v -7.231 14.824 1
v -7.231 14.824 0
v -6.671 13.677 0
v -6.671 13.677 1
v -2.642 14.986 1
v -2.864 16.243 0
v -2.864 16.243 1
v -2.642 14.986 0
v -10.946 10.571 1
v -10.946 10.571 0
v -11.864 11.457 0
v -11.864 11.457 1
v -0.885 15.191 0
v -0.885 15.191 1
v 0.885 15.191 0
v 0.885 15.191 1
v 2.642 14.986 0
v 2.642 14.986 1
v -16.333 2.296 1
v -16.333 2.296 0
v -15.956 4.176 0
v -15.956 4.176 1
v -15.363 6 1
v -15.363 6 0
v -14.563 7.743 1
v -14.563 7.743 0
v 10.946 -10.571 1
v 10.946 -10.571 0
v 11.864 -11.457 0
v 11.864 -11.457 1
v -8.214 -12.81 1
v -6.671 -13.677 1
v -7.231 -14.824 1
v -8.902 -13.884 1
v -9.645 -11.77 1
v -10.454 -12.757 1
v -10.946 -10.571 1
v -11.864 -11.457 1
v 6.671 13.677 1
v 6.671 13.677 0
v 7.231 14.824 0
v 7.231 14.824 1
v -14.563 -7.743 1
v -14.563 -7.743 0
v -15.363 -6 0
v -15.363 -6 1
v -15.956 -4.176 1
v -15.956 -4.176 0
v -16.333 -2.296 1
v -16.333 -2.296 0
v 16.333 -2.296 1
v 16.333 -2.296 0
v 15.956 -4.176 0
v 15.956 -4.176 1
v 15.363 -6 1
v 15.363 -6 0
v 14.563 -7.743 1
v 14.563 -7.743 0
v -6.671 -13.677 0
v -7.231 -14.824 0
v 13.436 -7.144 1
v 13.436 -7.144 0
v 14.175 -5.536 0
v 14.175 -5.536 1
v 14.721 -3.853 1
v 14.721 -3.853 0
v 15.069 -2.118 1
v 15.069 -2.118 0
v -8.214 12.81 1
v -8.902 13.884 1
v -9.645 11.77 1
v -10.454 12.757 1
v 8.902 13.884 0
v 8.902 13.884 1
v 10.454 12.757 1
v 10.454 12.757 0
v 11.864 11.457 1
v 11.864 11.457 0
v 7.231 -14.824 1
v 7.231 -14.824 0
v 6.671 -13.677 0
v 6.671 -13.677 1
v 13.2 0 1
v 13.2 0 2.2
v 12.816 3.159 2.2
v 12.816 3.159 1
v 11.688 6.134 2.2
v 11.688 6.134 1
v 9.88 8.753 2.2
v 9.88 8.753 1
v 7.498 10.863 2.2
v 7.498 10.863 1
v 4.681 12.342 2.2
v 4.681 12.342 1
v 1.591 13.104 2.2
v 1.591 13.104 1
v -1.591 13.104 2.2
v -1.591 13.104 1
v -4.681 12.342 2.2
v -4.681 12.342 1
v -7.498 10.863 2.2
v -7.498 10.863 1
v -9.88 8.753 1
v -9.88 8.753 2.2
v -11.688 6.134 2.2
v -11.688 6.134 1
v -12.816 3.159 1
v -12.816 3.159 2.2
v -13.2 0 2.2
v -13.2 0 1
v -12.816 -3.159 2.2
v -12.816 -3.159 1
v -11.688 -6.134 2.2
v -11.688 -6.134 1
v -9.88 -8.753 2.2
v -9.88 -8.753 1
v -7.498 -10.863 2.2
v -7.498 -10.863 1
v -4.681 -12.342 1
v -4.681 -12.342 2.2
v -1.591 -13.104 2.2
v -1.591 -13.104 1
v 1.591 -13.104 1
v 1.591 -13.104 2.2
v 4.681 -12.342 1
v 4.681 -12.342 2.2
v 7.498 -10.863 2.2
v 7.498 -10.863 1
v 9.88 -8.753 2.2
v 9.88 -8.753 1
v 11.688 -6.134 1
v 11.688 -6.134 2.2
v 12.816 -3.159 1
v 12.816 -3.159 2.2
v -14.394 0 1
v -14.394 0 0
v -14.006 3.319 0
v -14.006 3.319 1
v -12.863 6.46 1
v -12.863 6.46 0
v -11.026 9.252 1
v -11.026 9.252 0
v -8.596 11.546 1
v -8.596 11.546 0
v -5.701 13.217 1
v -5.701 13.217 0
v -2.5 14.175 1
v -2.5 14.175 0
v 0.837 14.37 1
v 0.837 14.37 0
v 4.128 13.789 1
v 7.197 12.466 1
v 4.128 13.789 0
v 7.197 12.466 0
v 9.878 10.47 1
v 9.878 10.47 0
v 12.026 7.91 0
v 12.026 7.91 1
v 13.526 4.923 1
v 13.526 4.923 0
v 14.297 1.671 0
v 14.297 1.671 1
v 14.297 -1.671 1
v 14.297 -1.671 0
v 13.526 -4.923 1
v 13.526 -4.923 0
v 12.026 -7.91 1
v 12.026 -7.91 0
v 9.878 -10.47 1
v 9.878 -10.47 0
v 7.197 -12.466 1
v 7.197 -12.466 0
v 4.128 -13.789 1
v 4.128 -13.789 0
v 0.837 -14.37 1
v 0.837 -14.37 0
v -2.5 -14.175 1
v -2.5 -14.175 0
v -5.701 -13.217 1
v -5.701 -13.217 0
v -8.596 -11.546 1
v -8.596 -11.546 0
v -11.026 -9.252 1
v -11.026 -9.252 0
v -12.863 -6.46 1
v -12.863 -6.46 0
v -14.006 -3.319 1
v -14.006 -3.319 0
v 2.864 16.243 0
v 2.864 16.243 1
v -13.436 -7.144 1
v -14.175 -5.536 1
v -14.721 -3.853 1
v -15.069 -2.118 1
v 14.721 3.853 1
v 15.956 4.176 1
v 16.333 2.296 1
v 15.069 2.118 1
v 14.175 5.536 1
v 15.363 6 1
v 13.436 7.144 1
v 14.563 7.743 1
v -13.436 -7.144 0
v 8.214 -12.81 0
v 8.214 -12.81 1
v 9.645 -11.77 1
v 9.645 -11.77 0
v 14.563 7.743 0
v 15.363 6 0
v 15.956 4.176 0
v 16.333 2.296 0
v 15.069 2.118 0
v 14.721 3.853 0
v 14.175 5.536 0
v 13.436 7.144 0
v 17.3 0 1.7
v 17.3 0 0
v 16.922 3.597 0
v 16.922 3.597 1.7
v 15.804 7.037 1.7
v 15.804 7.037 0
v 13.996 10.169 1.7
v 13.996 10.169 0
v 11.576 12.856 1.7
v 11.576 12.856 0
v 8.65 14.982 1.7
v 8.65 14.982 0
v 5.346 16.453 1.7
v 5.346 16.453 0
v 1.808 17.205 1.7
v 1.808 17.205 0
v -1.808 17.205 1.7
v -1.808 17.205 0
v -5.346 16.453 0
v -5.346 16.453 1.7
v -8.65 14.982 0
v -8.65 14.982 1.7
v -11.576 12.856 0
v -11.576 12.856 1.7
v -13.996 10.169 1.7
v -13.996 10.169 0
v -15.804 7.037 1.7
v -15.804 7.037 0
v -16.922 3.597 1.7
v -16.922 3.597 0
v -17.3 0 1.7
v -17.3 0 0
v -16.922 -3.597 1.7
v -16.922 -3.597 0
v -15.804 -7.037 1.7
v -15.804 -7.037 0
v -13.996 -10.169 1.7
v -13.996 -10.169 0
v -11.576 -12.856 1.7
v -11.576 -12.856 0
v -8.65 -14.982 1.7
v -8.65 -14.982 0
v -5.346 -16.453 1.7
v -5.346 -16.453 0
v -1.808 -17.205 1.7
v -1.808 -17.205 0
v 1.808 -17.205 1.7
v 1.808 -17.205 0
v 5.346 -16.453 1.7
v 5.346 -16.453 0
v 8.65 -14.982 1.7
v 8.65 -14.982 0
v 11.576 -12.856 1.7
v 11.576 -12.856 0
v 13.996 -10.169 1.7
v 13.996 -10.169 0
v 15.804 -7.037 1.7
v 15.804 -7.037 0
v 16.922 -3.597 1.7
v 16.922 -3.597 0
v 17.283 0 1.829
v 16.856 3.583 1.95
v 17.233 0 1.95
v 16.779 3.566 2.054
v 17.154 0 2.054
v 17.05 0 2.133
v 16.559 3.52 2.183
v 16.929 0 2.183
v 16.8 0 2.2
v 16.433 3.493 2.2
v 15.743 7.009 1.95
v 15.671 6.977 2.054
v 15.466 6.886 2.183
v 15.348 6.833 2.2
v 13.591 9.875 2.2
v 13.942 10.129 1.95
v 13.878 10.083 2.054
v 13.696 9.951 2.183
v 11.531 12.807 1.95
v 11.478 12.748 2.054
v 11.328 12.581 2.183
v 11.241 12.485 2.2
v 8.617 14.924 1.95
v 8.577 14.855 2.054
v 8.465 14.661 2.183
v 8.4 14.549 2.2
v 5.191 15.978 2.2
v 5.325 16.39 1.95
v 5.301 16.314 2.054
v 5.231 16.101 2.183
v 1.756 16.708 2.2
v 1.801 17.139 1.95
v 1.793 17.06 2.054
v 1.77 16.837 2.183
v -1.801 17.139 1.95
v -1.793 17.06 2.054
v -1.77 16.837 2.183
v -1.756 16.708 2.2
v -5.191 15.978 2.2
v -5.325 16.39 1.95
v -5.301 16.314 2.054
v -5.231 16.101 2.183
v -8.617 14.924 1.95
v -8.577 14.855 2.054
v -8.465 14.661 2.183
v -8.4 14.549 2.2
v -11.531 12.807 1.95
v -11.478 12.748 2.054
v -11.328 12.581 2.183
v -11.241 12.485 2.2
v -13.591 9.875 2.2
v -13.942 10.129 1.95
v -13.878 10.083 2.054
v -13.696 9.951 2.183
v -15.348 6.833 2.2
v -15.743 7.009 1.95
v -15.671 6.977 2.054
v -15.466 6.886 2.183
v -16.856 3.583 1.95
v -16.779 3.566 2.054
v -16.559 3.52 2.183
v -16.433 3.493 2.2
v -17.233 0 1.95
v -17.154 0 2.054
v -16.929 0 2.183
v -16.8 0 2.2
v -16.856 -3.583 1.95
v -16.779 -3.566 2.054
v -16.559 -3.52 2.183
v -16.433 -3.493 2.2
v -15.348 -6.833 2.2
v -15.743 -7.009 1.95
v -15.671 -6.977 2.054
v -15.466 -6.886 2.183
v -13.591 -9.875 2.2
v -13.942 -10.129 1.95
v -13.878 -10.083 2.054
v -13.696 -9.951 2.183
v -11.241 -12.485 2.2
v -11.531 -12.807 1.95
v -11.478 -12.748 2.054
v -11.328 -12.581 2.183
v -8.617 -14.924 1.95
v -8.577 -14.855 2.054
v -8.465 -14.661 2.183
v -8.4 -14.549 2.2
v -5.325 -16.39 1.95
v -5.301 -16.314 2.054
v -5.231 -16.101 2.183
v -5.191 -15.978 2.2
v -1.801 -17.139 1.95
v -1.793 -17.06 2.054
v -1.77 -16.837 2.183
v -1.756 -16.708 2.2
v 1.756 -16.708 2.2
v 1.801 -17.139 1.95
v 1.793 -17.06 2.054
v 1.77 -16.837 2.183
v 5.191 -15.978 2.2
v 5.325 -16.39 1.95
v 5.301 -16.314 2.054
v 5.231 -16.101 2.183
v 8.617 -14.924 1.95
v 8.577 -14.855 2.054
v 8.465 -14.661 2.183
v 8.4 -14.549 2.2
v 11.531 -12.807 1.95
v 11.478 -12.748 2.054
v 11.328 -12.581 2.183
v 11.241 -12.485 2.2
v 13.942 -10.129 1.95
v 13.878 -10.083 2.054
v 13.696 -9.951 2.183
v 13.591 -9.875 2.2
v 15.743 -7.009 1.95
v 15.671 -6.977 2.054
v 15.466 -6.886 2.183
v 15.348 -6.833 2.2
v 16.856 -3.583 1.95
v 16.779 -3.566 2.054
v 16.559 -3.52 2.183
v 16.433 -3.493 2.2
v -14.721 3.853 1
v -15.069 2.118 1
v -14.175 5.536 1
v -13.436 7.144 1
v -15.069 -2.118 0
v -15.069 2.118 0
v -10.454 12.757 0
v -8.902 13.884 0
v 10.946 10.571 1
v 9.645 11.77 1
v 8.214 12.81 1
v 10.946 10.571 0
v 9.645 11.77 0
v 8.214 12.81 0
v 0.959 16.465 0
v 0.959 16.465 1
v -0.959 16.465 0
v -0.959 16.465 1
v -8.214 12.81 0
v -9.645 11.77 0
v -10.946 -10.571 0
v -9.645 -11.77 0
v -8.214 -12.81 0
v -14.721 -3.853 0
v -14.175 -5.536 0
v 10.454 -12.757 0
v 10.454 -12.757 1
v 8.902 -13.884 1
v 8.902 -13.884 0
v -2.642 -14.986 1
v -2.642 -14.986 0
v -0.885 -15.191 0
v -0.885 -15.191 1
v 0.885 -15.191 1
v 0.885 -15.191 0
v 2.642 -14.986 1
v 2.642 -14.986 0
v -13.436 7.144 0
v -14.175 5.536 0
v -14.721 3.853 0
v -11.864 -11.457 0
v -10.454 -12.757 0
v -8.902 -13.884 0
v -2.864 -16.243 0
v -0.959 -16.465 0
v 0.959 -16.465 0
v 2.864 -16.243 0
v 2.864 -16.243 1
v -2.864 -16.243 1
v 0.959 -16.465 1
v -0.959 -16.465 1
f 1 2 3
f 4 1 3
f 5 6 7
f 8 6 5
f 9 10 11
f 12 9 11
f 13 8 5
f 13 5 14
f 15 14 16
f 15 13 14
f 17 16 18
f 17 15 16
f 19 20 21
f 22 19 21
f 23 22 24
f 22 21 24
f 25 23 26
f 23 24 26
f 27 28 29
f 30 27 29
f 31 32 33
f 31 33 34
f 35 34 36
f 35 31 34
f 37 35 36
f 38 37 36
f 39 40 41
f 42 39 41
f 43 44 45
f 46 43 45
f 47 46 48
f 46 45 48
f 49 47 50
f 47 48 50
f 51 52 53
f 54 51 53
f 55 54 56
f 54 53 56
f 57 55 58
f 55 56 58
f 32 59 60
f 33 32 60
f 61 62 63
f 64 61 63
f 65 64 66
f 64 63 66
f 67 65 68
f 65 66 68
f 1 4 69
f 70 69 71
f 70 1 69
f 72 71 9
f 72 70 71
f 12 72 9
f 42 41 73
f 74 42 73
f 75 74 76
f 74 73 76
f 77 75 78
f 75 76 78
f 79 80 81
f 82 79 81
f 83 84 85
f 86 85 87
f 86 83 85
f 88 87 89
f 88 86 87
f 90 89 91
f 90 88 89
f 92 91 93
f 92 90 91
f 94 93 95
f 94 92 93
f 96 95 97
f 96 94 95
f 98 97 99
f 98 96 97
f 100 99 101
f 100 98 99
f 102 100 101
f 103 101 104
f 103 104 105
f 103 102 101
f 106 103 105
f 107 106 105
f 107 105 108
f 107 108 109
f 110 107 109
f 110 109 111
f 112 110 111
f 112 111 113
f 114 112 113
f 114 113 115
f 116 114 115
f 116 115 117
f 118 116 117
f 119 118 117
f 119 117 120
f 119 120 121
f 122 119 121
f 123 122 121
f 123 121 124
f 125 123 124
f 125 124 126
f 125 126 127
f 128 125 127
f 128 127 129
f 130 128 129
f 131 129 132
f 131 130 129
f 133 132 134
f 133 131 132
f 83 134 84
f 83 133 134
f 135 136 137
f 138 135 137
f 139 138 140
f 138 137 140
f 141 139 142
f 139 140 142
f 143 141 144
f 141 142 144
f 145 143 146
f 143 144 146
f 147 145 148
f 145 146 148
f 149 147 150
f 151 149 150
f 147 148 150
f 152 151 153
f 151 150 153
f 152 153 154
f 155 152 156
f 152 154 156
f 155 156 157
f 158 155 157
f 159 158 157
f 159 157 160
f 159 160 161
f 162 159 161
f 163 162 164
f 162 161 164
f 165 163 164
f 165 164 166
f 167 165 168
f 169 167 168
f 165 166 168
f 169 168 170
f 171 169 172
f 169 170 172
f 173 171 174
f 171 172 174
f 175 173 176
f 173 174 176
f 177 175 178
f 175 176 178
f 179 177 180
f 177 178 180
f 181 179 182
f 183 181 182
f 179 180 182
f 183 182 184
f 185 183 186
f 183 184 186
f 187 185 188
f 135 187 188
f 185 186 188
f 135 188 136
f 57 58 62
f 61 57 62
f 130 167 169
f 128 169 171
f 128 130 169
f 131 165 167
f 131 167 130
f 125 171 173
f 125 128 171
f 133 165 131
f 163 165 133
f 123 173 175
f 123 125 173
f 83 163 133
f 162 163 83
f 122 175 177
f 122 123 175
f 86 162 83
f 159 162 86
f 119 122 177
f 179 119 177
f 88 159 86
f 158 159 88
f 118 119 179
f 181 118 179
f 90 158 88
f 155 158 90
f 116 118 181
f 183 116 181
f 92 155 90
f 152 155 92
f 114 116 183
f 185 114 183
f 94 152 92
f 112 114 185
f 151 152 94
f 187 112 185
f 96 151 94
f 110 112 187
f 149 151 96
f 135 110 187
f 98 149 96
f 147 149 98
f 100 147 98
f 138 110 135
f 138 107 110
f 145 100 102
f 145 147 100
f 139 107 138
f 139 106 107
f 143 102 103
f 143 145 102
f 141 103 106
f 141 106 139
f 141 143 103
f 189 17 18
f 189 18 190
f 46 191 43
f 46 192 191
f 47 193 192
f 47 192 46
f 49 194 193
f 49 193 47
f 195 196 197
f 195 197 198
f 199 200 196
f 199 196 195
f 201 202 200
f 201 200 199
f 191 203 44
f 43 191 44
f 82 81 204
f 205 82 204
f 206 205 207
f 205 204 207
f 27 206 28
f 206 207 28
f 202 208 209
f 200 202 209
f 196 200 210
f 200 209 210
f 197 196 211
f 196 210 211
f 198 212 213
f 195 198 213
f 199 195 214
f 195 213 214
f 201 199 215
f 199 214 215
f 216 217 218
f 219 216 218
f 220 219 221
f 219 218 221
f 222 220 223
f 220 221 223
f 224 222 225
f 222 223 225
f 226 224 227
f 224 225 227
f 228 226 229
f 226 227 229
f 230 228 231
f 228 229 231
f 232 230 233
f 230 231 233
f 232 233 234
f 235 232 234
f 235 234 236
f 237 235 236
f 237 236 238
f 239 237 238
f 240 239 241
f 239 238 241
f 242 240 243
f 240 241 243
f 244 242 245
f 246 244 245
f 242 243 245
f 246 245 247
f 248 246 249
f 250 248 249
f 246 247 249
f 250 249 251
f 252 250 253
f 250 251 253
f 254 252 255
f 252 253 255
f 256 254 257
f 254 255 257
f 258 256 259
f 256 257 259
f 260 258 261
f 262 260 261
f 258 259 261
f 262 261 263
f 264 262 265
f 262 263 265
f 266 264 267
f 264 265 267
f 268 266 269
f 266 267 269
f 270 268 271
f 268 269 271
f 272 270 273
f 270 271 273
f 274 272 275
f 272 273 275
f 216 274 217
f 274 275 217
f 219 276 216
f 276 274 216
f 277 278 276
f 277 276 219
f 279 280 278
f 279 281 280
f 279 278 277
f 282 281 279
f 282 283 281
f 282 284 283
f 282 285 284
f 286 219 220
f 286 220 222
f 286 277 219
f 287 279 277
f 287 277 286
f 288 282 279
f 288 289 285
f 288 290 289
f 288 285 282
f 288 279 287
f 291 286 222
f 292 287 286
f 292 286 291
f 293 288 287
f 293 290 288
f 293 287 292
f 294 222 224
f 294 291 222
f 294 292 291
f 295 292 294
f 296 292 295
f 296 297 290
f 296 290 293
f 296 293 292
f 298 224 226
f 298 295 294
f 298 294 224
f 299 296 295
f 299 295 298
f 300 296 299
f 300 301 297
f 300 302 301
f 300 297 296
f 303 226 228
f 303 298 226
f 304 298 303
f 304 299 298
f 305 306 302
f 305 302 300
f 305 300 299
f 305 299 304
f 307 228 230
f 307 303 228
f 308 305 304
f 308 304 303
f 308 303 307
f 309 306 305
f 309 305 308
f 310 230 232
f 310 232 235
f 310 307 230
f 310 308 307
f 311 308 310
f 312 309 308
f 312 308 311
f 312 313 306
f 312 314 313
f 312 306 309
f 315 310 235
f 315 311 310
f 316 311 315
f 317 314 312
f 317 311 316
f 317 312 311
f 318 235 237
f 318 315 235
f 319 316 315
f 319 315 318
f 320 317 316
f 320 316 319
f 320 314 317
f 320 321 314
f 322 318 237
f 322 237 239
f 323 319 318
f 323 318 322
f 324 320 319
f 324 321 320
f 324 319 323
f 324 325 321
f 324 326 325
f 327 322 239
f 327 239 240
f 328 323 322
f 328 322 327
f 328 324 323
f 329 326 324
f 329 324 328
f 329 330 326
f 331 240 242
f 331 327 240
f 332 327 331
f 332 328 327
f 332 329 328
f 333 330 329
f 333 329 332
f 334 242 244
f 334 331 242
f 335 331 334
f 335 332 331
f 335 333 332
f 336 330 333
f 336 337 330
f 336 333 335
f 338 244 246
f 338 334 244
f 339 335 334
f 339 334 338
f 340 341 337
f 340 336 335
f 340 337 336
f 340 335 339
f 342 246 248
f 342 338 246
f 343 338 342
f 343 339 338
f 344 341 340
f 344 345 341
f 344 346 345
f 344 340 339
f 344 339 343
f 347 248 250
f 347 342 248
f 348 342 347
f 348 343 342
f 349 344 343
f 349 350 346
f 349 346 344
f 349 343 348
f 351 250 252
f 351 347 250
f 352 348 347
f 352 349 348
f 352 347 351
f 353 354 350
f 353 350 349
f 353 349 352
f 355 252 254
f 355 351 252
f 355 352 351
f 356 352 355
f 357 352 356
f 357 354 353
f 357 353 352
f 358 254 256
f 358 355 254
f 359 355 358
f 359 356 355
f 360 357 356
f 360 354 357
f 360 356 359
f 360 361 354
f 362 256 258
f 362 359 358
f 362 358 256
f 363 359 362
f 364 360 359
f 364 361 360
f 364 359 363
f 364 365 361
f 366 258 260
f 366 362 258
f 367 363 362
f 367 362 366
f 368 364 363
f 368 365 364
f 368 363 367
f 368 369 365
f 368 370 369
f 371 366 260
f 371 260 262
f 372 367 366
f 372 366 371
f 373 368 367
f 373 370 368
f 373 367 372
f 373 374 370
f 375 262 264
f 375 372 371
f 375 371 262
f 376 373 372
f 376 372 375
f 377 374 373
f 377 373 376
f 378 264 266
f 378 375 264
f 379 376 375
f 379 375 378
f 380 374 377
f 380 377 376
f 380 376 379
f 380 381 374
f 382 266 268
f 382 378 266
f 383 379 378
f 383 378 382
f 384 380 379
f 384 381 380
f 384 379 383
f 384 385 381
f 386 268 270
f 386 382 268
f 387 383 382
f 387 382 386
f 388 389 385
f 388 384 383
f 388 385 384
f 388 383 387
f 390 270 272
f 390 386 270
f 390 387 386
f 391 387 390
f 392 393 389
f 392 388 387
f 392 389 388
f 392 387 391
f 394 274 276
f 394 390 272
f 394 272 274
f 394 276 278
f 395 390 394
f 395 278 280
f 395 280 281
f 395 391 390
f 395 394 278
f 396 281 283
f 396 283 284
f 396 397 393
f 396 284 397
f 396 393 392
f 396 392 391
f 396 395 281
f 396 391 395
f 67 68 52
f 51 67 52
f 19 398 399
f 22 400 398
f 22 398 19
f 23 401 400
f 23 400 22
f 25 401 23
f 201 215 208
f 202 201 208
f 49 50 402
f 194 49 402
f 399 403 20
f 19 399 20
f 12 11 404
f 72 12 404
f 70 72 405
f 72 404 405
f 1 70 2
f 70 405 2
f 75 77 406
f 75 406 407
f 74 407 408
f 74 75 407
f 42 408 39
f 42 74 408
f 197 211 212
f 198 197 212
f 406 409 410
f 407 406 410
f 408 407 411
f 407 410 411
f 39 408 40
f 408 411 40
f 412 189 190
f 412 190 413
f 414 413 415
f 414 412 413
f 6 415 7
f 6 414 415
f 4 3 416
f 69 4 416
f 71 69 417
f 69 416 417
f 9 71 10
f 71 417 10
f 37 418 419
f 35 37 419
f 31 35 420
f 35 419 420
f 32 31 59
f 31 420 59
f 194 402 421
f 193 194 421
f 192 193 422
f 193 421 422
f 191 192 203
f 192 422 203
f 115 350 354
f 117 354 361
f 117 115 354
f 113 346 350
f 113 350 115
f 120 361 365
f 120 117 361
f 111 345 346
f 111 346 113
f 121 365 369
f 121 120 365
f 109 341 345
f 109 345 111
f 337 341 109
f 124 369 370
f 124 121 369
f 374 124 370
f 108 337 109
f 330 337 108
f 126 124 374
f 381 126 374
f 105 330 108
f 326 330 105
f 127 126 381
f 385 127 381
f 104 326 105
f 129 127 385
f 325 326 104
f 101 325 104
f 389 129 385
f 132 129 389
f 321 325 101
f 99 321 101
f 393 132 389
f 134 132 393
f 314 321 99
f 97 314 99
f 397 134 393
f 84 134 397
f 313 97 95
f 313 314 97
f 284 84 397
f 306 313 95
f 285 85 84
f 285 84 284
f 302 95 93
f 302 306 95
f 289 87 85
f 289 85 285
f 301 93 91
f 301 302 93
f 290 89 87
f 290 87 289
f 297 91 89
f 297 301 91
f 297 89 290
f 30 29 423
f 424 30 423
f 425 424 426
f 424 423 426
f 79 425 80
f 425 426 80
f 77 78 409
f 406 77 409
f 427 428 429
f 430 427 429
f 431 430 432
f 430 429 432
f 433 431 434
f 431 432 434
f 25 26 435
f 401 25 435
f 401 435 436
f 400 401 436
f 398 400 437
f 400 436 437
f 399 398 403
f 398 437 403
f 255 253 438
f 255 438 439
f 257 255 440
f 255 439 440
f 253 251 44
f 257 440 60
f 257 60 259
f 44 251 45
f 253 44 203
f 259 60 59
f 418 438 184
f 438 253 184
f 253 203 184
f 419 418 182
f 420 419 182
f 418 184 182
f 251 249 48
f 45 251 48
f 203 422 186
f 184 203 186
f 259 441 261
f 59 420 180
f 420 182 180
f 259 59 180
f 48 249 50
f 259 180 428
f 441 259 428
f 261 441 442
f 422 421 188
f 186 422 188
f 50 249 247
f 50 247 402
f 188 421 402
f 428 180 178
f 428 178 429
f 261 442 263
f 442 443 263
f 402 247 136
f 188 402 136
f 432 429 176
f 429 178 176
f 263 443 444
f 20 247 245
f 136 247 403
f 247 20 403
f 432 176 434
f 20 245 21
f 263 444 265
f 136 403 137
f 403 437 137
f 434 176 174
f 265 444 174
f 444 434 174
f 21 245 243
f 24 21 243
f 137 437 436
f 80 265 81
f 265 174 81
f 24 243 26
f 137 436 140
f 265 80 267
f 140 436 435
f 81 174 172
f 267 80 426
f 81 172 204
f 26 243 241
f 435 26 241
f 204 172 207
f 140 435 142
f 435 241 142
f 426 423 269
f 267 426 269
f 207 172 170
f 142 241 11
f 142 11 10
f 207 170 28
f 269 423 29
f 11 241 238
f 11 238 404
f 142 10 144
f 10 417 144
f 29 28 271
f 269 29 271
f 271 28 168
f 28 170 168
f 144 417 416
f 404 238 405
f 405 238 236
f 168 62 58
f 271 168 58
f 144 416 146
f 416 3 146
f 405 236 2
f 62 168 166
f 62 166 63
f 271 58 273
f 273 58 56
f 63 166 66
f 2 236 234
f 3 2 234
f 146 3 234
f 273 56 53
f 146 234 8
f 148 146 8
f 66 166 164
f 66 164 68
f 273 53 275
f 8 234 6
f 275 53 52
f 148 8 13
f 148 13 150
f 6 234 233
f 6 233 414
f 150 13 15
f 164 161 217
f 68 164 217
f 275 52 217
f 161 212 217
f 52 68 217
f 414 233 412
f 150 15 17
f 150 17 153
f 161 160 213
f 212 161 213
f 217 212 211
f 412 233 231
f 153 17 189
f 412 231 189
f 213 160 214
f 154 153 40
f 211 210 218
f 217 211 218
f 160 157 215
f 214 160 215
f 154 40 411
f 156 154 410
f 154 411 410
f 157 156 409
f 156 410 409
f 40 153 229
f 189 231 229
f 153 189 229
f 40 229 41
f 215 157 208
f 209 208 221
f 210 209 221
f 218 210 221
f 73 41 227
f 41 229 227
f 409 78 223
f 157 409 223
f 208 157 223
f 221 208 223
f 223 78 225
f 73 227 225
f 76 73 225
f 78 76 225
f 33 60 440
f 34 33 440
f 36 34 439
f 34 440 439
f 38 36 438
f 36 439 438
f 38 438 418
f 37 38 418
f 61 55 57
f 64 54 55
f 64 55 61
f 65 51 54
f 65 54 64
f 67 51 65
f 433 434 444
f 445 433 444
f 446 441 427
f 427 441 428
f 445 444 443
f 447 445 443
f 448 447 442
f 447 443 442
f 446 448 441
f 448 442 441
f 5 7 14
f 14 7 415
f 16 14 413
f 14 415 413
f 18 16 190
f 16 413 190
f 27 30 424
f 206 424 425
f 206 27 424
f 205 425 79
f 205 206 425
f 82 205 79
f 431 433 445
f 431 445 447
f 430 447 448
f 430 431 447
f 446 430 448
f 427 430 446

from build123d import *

# Parameters (mm, degrees)
SKETCH_1_R          = 17.3
SKETCH_1_R_2        = 13.2
EXTRUDE_1_DEPTH     = 2.2
SKETCH_2_R          = 14.394054642
CUT_EXTRUDE_1_DEPTH = 1
CUT_EXTRUDE_2_DEPTH = 1
FILLET_1_R          = 0.5


with BuildPart() as part:
    # 草图1 → 凸台-拉伸1 (new body)
    with BuildSketch(Plane.XY):
        Circle(SKETCH_1_R)
        Circle(SKETCH_1_R_2, mode=Mode.SUBTRACT)
    extrude(amount=EXTRUDE_1_DEPTH)

    # 草图2 → 切除-拉伸1 (cut)
    with BuildSketch(Plane(origin=(0, 0, 0), x_dir=(-1, 0, 0), z_dir=(0, 0, -1))):
        Circle(SKETCH_2_R)
    extrude(amount=-CUT_EXTRUDE_1_DEPTH, mode=Mode.SUBTRACT)

    # 草图3 → 切除-拉伸2 (cut)
    with BuildSketch(Plane(origin=(0, 0, 0), x_dir=(-1, 0, 0), z_dir=(0, 0, -1))):
        with BuildLine():
            Line((-2.642058299, 14.986101169), (-2.863597348, 16.242699714))
            ThreePointArc((-2.863597348, 16.242699714), (0, 16.493195075), (2.863597348, 16.242699714))
            Line((2.863597348, 16.242699714), (2.642058299, 14.986101169))
            ThreePointArc((2.642058299, 14.986101169), (0, 15.217217233), (-2.642058299, 14.986101169))
        make_face()
        with BuildLine():
            Line((10.94607932, 10.571047622), (11.863918269, 11.457439813))
            ThreePointArc((11.863918269, 11.457439813), (9.694456828, 13.343275107), (7.23052043, 14.823800393))
            Line((7.23052043, 14.823800393), (6.671139193, 13.676973429))
            ThreePointArc((6.671139193, 13.676973429), (8.94445587, 12.310987348), (10.94607932, 10.571047622))
        make_face()
        with BuildLine():
            Line((15.069070085, 2.118213179), (16.332625651, 2.295827328))
            ThreePointArc((16.332625651, 2.295827328), (15.685960651, 5.09667757), (14.56282516, 7.742713165))
            Line((14.56282516, 7.742713165), (13.436188256, 7.143706702))
            ThreePointArc((13.436188256, 7.143706702), (14.472433609, 4.702378732), (15.069070085, 2.118213179))
        make_face()
        with BuildLine():
            Line((13.436188256, -7.143706702), (14.56282516, -7.742713165))
            ThreePointArc((14.56282516, -7.742713165), (15.685960651, -5.09667757), (16.332625651, -2.295827328))
            Line((16.332625651, -2.295827328), (15.069070085, -2.118213179))
            ThreePointArc((15.069070085, -2.118213179), (14.472433609, -4.702378732), (13.436188256, -7.143706702))
        make_face()
        with BuildLine():
            Line((6.671139193, -13.676973429), (7.23052043, -14.823800393))
            ThreePointArc((7.23052043, -14.823800393), (9.694456828, -13.343275107), (11.863918269, -11.457439813))
            Line((11.863918269, -11.457439813), (10.94607932, -10.571047622))
            ThreePointArc((10.94607932, -10.571047622), (8.94445587, -12.310987348), (6.671139193, -13.676973429))
        make_face()
        with BuildLine():
            Line((-2.642058299, -14.986101169), (-2.863597348, -16.242699714))
            ThreePointArc((-2.863597348, -16.242699714), (0, -16.493195075), (2.863597348, -16.242699714))
            Line((2.863597348, -16.242699714), (2.642058299, -14.986101169))
            ThreePointArc((2.642058299, -14.986101169), (0, -15.217217233), (-2.642058299, -14.986101169))
        make_face()
        with BuildLine():
            Line((-10.94607932, -10.571047622), (-11.863918269, -11.457439813))
            ThreePointArc((-11.863918269, -11.457439813), (-9.694456828, -13.343275107), (-7.23052043, -14.823800393))
            Line((-7.23052043, -14.823800393), (-6.671139193, -13.676973429))
            ThreePointArc((-6.671139193, -13.676973429), (-8.94445587, -12.310987348), (-10.94607932, -10.571047622))
        make_face()
        with BuildLine():
            Line((-15.069070085, -2.118213179), (-16.332625651, -2.295827328))
            ThreePointArc((-16.332625651, -2.295827328), (-15.685960651, -5.09667757), (-14.56282516, -7.742713165))
            Line((-14.56282516, -7.742713165), (-13.436188256, -7.143706702))
            ThreePointArc((-13.436188256, -7.143706702), (-14.472433609, -4.702378732), (-15.069070085, -2.118213179))
        make_face()
        with BuildLine():
            Line((-13.436188256, 7.143706702), (-14.56282516, 7.742713165))
            ThreePointArc((-14.56282516, 7.742713165), (-15.685960651, 5.09667757), (-16.332625651, 2.295827328))
            Line((-16.332625651, 2.295827328), (-15.069070085, 2.118213179))
            ThreePointArc((-15.069070085, 2.118213179), (-14.472433609, 4.702378732), (-13.436188256, 7.143706702))
        make_face()
        with BuildLine():
            Line((-6.671139193, 13.676973429), (-7.23052043, 14.823800393))
            ThreePointArc((-7.23052043, 14.823800393), (-9.694456828, 13.343275107), (-11.863918269, 11.457439813))
            Line((-11.863918269, 11.457439813), (-10.94607932, 10.571047622))
            ThreePointArc((-10.94607932, 10.571047622), (-8.94445587, 12.310987348), (-6.671139193, 13.676973429))
        make_face()
    extrude(amount=-CUT_EXTRUDE_2_DEPTH, mode=Mode.SUBTRACT)

    # 圆角1
    fillet_1_edges = [part.edges().sort_by_distance(p)[0] for p in [
        (-17.3, 0, 2.2),
    ]]
    fillet(fillet_1_edges, radius=FILLET_1_R)


solid = part.part
